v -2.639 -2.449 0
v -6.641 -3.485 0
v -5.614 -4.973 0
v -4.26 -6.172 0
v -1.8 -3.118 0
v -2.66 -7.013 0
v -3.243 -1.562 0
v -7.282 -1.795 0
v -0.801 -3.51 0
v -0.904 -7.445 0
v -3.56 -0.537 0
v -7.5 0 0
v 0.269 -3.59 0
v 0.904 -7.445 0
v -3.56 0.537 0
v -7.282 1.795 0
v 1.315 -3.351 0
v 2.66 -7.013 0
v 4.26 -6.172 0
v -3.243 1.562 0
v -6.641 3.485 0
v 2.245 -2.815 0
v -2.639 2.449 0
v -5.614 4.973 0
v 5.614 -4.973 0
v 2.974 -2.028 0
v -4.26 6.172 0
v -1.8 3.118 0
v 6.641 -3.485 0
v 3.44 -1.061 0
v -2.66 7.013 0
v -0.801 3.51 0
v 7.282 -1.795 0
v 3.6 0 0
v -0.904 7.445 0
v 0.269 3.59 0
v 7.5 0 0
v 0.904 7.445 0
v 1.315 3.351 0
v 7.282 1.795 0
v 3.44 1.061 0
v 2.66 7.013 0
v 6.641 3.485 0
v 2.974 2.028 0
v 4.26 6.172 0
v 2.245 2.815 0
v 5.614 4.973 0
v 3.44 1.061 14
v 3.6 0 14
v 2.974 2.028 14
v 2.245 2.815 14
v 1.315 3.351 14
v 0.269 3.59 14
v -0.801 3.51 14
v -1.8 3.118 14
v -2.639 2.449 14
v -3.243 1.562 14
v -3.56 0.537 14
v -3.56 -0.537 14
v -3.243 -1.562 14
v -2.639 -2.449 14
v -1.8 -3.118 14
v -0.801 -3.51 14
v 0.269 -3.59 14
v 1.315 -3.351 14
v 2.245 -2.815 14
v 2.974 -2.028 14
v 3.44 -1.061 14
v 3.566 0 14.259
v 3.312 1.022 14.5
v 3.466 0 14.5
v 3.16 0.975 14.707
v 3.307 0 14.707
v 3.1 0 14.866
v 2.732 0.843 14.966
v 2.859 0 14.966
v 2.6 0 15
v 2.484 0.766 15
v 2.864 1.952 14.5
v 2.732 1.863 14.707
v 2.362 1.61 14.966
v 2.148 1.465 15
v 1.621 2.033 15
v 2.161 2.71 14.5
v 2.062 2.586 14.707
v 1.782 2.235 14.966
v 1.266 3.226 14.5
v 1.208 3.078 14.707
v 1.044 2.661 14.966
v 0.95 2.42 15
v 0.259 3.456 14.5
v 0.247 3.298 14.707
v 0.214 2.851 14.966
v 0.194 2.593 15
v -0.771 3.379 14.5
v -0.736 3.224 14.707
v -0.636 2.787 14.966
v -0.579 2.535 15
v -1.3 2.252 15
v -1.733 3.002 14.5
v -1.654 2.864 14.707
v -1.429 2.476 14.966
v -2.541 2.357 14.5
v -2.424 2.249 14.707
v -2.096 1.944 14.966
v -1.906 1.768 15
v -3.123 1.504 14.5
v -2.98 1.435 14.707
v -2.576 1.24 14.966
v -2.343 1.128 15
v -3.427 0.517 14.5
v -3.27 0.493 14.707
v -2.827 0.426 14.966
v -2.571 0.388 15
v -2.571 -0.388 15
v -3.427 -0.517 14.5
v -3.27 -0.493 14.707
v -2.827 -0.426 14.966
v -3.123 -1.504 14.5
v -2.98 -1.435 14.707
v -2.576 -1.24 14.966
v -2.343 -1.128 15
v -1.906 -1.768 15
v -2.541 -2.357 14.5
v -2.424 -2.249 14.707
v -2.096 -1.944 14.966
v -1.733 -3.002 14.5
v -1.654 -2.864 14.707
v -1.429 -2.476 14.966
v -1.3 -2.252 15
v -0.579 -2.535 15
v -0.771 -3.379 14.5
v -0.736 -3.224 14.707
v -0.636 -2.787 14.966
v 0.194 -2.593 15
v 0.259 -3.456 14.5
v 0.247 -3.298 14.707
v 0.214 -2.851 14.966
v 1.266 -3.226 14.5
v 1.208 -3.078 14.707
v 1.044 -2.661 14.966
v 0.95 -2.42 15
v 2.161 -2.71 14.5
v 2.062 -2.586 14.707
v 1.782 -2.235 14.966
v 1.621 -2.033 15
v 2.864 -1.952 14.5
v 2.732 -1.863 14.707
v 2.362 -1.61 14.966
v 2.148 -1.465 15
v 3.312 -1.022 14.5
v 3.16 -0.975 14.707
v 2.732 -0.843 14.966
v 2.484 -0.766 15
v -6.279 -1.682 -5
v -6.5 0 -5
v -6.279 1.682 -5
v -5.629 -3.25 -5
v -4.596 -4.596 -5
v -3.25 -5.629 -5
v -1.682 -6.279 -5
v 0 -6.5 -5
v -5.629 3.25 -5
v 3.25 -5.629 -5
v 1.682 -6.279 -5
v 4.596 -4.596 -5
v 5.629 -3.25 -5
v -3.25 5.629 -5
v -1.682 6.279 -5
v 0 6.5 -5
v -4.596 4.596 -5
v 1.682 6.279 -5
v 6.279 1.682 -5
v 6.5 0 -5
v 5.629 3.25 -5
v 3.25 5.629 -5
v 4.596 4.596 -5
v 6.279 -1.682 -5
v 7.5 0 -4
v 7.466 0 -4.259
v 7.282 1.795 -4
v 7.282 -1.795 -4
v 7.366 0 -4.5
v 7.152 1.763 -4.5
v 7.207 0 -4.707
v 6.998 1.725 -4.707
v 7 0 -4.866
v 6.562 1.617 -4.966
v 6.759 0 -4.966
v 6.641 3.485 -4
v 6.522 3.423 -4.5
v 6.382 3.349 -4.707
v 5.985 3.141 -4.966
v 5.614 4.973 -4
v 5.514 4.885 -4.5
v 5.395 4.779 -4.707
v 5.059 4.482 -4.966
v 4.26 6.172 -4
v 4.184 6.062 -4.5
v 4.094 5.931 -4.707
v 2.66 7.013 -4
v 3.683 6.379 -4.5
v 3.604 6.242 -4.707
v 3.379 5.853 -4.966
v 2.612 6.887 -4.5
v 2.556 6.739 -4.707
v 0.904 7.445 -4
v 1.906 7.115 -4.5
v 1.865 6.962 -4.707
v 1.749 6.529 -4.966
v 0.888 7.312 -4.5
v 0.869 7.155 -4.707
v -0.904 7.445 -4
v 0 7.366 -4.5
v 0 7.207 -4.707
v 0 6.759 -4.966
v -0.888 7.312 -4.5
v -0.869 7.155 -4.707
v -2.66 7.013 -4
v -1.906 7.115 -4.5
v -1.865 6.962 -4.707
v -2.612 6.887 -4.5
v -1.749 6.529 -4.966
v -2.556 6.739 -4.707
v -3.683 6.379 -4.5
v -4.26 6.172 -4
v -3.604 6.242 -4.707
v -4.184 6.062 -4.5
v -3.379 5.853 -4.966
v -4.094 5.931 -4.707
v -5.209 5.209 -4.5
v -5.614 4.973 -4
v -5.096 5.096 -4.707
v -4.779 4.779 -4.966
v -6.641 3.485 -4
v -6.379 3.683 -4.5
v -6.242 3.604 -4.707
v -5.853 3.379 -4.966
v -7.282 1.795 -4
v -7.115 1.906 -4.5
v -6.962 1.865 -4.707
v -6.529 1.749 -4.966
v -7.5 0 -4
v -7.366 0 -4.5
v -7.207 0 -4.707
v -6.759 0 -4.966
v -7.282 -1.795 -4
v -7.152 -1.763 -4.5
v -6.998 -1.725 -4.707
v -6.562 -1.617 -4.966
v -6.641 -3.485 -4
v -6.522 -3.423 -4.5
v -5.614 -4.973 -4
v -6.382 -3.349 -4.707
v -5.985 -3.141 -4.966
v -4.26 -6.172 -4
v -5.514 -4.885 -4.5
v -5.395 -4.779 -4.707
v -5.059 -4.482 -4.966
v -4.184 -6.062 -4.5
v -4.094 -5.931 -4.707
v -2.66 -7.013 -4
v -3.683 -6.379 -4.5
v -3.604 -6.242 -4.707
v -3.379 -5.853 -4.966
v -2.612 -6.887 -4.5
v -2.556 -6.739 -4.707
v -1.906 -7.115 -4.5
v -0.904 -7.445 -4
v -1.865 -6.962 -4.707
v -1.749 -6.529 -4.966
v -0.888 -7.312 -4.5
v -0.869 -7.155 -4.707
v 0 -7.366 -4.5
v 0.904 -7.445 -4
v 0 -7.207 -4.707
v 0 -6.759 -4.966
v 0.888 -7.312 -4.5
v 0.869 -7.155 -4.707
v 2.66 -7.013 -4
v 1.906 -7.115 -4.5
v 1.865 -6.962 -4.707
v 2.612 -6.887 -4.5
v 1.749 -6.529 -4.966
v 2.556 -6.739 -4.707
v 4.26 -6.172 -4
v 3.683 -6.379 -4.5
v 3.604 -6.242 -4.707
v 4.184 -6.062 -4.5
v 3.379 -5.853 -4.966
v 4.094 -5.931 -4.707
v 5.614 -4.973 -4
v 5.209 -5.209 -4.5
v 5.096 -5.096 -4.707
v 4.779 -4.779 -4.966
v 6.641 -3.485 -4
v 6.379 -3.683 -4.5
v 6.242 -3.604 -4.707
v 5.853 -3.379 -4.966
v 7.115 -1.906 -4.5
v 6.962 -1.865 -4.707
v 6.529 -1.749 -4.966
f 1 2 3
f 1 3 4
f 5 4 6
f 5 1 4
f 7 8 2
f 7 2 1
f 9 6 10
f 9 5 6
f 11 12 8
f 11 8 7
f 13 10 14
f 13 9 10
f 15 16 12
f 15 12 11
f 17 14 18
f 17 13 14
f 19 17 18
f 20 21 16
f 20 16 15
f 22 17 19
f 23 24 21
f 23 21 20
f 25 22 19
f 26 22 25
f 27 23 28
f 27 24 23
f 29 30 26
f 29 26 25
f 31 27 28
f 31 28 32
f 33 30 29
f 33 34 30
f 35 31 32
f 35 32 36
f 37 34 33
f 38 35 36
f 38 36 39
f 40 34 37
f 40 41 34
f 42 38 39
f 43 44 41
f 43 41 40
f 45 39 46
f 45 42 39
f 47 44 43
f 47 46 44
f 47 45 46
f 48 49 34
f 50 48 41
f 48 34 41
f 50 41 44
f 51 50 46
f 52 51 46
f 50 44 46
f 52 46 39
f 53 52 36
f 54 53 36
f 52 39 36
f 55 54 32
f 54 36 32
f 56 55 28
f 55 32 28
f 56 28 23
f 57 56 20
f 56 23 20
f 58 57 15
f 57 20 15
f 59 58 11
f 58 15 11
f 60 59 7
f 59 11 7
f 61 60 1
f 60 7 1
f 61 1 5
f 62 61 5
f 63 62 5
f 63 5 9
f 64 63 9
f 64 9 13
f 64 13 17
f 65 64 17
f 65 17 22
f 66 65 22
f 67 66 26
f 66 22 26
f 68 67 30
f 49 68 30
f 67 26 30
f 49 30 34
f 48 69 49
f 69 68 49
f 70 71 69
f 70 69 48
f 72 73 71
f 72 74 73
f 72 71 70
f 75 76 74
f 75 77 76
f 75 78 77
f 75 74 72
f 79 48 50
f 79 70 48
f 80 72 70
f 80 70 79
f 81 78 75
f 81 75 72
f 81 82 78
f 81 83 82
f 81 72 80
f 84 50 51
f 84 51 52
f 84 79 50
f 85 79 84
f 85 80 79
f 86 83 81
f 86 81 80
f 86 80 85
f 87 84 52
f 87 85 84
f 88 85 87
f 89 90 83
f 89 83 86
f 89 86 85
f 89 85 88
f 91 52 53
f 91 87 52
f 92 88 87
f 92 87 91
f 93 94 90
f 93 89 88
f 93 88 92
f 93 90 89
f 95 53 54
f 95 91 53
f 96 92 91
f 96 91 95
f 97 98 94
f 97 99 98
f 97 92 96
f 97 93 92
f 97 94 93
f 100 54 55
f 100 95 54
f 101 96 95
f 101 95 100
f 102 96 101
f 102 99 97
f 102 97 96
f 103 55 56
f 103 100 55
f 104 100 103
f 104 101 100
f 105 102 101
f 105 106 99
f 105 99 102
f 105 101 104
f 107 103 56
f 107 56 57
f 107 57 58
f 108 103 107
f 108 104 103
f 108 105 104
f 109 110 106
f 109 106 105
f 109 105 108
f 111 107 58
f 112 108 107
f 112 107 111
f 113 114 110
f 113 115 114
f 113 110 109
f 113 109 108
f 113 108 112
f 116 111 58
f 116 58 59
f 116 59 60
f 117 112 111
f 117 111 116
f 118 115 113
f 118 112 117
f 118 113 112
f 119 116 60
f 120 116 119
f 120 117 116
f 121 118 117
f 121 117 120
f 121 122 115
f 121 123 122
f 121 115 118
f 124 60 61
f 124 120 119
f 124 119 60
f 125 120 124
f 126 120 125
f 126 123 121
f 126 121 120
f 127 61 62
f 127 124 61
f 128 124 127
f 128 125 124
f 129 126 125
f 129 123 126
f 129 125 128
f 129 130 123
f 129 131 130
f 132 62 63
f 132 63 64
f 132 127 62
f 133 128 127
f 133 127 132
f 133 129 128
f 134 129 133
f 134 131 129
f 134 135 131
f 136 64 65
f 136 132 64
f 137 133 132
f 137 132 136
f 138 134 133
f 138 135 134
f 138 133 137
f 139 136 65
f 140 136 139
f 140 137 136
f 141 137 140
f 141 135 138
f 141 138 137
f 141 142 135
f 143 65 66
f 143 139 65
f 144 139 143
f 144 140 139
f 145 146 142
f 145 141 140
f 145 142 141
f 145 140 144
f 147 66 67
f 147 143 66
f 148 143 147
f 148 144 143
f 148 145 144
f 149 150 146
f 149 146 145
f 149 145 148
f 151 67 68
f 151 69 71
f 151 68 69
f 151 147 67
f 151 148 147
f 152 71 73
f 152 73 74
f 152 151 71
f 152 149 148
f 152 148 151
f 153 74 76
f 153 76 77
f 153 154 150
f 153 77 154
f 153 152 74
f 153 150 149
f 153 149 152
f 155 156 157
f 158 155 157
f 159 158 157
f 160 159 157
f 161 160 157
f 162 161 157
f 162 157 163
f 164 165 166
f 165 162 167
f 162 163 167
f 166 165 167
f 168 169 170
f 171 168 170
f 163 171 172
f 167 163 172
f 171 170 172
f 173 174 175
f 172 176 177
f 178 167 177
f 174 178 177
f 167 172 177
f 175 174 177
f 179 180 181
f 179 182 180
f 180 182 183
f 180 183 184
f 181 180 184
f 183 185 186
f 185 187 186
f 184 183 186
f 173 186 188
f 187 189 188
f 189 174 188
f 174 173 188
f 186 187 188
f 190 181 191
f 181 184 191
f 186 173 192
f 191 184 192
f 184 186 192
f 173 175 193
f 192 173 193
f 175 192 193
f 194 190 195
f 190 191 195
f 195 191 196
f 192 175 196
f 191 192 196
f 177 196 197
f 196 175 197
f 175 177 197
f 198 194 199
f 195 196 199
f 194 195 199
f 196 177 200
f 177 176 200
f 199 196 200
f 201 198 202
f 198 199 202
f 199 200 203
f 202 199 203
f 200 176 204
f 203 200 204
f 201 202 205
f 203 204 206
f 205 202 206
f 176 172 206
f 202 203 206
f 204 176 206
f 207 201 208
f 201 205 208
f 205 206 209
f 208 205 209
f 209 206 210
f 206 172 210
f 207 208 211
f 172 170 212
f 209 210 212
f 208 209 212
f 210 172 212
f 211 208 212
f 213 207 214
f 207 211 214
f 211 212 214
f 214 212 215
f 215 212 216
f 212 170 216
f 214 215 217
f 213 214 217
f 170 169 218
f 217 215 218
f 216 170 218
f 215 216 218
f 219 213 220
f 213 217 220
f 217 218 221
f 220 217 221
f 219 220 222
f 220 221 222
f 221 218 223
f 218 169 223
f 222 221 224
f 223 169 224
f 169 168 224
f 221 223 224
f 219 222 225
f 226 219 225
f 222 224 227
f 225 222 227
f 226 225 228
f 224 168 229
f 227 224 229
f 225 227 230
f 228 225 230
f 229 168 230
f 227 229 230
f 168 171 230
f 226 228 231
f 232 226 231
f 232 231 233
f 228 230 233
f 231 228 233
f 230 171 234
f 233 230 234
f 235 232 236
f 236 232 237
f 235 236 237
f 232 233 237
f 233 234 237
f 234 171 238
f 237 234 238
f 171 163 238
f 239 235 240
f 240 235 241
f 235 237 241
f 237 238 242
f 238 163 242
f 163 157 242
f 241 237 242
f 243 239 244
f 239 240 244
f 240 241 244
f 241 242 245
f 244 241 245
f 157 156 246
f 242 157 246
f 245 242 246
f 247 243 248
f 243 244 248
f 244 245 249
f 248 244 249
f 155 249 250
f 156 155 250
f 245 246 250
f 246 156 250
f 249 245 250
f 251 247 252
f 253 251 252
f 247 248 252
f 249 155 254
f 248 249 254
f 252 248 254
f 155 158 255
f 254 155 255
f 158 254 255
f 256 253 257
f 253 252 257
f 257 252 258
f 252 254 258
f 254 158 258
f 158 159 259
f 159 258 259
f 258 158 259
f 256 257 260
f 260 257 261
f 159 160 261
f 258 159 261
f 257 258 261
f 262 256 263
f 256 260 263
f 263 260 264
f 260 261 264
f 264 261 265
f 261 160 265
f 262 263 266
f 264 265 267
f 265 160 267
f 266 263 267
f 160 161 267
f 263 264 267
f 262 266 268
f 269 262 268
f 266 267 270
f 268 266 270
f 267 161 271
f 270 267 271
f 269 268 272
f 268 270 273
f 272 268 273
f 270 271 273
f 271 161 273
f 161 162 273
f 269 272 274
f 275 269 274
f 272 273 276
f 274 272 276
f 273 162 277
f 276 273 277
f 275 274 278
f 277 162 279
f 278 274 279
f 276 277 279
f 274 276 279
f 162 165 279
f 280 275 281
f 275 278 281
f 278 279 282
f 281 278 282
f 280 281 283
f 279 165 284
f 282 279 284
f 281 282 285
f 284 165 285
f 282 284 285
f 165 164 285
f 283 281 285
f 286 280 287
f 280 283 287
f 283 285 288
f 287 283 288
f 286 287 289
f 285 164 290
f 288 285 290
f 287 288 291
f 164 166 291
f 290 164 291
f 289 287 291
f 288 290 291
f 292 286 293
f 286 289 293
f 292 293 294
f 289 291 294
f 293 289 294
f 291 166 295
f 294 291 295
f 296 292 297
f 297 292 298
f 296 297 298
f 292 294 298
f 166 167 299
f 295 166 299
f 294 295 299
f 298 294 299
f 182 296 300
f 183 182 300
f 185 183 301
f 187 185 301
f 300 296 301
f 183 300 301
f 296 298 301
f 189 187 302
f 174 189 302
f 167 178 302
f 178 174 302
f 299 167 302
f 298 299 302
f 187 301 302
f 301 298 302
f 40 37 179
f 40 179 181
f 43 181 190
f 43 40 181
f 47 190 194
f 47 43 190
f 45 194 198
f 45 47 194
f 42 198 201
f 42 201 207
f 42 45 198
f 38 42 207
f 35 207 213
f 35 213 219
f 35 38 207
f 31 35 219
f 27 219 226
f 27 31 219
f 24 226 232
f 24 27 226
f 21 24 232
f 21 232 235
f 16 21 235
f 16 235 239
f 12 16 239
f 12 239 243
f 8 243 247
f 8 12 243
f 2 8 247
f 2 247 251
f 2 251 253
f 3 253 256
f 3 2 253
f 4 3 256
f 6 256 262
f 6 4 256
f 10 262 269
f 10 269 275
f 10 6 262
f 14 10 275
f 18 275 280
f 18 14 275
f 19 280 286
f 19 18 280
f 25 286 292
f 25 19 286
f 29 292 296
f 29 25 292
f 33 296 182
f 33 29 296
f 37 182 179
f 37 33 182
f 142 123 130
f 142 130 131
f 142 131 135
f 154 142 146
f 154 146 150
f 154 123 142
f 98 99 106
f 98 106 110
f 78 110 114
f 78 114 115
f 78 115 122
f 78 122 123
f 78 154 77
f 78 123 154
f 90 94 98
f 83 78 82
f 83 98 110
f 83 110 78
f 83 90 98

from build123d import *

# Parameters (mm, degrees)
F0_R     = 3.6
F1_DEPTH = 15
F0_R_2   = 7.5
F2_DEPTH = 5
F3_R     = 1


with BuildPart() as f1:
    # F0 (on Top) → F1 (new body)
    with BuildSketch(Plane.XY):
        Circle(F0_R)
    extrude(amount=F1_DEPTH)

    # F0 (on Top) → F2 (join)
    with BuildSketch(Plane.XY):
        Circle(F0_R_2)
        Circle(F0_R, mode=Mode.SUBTRACT)
        Circle(F0_R)
    extrude(amount=-F2_DEPTH)

    # F3
    f3_edges = [f1.edges().sort_by_distance(p)[0] for p in [
        (-3.6, 0, 15),
        (-7.5, 0, -5),
    ]]
    fillet(f3_edges, radius=F3_R)


solid = f1.part
